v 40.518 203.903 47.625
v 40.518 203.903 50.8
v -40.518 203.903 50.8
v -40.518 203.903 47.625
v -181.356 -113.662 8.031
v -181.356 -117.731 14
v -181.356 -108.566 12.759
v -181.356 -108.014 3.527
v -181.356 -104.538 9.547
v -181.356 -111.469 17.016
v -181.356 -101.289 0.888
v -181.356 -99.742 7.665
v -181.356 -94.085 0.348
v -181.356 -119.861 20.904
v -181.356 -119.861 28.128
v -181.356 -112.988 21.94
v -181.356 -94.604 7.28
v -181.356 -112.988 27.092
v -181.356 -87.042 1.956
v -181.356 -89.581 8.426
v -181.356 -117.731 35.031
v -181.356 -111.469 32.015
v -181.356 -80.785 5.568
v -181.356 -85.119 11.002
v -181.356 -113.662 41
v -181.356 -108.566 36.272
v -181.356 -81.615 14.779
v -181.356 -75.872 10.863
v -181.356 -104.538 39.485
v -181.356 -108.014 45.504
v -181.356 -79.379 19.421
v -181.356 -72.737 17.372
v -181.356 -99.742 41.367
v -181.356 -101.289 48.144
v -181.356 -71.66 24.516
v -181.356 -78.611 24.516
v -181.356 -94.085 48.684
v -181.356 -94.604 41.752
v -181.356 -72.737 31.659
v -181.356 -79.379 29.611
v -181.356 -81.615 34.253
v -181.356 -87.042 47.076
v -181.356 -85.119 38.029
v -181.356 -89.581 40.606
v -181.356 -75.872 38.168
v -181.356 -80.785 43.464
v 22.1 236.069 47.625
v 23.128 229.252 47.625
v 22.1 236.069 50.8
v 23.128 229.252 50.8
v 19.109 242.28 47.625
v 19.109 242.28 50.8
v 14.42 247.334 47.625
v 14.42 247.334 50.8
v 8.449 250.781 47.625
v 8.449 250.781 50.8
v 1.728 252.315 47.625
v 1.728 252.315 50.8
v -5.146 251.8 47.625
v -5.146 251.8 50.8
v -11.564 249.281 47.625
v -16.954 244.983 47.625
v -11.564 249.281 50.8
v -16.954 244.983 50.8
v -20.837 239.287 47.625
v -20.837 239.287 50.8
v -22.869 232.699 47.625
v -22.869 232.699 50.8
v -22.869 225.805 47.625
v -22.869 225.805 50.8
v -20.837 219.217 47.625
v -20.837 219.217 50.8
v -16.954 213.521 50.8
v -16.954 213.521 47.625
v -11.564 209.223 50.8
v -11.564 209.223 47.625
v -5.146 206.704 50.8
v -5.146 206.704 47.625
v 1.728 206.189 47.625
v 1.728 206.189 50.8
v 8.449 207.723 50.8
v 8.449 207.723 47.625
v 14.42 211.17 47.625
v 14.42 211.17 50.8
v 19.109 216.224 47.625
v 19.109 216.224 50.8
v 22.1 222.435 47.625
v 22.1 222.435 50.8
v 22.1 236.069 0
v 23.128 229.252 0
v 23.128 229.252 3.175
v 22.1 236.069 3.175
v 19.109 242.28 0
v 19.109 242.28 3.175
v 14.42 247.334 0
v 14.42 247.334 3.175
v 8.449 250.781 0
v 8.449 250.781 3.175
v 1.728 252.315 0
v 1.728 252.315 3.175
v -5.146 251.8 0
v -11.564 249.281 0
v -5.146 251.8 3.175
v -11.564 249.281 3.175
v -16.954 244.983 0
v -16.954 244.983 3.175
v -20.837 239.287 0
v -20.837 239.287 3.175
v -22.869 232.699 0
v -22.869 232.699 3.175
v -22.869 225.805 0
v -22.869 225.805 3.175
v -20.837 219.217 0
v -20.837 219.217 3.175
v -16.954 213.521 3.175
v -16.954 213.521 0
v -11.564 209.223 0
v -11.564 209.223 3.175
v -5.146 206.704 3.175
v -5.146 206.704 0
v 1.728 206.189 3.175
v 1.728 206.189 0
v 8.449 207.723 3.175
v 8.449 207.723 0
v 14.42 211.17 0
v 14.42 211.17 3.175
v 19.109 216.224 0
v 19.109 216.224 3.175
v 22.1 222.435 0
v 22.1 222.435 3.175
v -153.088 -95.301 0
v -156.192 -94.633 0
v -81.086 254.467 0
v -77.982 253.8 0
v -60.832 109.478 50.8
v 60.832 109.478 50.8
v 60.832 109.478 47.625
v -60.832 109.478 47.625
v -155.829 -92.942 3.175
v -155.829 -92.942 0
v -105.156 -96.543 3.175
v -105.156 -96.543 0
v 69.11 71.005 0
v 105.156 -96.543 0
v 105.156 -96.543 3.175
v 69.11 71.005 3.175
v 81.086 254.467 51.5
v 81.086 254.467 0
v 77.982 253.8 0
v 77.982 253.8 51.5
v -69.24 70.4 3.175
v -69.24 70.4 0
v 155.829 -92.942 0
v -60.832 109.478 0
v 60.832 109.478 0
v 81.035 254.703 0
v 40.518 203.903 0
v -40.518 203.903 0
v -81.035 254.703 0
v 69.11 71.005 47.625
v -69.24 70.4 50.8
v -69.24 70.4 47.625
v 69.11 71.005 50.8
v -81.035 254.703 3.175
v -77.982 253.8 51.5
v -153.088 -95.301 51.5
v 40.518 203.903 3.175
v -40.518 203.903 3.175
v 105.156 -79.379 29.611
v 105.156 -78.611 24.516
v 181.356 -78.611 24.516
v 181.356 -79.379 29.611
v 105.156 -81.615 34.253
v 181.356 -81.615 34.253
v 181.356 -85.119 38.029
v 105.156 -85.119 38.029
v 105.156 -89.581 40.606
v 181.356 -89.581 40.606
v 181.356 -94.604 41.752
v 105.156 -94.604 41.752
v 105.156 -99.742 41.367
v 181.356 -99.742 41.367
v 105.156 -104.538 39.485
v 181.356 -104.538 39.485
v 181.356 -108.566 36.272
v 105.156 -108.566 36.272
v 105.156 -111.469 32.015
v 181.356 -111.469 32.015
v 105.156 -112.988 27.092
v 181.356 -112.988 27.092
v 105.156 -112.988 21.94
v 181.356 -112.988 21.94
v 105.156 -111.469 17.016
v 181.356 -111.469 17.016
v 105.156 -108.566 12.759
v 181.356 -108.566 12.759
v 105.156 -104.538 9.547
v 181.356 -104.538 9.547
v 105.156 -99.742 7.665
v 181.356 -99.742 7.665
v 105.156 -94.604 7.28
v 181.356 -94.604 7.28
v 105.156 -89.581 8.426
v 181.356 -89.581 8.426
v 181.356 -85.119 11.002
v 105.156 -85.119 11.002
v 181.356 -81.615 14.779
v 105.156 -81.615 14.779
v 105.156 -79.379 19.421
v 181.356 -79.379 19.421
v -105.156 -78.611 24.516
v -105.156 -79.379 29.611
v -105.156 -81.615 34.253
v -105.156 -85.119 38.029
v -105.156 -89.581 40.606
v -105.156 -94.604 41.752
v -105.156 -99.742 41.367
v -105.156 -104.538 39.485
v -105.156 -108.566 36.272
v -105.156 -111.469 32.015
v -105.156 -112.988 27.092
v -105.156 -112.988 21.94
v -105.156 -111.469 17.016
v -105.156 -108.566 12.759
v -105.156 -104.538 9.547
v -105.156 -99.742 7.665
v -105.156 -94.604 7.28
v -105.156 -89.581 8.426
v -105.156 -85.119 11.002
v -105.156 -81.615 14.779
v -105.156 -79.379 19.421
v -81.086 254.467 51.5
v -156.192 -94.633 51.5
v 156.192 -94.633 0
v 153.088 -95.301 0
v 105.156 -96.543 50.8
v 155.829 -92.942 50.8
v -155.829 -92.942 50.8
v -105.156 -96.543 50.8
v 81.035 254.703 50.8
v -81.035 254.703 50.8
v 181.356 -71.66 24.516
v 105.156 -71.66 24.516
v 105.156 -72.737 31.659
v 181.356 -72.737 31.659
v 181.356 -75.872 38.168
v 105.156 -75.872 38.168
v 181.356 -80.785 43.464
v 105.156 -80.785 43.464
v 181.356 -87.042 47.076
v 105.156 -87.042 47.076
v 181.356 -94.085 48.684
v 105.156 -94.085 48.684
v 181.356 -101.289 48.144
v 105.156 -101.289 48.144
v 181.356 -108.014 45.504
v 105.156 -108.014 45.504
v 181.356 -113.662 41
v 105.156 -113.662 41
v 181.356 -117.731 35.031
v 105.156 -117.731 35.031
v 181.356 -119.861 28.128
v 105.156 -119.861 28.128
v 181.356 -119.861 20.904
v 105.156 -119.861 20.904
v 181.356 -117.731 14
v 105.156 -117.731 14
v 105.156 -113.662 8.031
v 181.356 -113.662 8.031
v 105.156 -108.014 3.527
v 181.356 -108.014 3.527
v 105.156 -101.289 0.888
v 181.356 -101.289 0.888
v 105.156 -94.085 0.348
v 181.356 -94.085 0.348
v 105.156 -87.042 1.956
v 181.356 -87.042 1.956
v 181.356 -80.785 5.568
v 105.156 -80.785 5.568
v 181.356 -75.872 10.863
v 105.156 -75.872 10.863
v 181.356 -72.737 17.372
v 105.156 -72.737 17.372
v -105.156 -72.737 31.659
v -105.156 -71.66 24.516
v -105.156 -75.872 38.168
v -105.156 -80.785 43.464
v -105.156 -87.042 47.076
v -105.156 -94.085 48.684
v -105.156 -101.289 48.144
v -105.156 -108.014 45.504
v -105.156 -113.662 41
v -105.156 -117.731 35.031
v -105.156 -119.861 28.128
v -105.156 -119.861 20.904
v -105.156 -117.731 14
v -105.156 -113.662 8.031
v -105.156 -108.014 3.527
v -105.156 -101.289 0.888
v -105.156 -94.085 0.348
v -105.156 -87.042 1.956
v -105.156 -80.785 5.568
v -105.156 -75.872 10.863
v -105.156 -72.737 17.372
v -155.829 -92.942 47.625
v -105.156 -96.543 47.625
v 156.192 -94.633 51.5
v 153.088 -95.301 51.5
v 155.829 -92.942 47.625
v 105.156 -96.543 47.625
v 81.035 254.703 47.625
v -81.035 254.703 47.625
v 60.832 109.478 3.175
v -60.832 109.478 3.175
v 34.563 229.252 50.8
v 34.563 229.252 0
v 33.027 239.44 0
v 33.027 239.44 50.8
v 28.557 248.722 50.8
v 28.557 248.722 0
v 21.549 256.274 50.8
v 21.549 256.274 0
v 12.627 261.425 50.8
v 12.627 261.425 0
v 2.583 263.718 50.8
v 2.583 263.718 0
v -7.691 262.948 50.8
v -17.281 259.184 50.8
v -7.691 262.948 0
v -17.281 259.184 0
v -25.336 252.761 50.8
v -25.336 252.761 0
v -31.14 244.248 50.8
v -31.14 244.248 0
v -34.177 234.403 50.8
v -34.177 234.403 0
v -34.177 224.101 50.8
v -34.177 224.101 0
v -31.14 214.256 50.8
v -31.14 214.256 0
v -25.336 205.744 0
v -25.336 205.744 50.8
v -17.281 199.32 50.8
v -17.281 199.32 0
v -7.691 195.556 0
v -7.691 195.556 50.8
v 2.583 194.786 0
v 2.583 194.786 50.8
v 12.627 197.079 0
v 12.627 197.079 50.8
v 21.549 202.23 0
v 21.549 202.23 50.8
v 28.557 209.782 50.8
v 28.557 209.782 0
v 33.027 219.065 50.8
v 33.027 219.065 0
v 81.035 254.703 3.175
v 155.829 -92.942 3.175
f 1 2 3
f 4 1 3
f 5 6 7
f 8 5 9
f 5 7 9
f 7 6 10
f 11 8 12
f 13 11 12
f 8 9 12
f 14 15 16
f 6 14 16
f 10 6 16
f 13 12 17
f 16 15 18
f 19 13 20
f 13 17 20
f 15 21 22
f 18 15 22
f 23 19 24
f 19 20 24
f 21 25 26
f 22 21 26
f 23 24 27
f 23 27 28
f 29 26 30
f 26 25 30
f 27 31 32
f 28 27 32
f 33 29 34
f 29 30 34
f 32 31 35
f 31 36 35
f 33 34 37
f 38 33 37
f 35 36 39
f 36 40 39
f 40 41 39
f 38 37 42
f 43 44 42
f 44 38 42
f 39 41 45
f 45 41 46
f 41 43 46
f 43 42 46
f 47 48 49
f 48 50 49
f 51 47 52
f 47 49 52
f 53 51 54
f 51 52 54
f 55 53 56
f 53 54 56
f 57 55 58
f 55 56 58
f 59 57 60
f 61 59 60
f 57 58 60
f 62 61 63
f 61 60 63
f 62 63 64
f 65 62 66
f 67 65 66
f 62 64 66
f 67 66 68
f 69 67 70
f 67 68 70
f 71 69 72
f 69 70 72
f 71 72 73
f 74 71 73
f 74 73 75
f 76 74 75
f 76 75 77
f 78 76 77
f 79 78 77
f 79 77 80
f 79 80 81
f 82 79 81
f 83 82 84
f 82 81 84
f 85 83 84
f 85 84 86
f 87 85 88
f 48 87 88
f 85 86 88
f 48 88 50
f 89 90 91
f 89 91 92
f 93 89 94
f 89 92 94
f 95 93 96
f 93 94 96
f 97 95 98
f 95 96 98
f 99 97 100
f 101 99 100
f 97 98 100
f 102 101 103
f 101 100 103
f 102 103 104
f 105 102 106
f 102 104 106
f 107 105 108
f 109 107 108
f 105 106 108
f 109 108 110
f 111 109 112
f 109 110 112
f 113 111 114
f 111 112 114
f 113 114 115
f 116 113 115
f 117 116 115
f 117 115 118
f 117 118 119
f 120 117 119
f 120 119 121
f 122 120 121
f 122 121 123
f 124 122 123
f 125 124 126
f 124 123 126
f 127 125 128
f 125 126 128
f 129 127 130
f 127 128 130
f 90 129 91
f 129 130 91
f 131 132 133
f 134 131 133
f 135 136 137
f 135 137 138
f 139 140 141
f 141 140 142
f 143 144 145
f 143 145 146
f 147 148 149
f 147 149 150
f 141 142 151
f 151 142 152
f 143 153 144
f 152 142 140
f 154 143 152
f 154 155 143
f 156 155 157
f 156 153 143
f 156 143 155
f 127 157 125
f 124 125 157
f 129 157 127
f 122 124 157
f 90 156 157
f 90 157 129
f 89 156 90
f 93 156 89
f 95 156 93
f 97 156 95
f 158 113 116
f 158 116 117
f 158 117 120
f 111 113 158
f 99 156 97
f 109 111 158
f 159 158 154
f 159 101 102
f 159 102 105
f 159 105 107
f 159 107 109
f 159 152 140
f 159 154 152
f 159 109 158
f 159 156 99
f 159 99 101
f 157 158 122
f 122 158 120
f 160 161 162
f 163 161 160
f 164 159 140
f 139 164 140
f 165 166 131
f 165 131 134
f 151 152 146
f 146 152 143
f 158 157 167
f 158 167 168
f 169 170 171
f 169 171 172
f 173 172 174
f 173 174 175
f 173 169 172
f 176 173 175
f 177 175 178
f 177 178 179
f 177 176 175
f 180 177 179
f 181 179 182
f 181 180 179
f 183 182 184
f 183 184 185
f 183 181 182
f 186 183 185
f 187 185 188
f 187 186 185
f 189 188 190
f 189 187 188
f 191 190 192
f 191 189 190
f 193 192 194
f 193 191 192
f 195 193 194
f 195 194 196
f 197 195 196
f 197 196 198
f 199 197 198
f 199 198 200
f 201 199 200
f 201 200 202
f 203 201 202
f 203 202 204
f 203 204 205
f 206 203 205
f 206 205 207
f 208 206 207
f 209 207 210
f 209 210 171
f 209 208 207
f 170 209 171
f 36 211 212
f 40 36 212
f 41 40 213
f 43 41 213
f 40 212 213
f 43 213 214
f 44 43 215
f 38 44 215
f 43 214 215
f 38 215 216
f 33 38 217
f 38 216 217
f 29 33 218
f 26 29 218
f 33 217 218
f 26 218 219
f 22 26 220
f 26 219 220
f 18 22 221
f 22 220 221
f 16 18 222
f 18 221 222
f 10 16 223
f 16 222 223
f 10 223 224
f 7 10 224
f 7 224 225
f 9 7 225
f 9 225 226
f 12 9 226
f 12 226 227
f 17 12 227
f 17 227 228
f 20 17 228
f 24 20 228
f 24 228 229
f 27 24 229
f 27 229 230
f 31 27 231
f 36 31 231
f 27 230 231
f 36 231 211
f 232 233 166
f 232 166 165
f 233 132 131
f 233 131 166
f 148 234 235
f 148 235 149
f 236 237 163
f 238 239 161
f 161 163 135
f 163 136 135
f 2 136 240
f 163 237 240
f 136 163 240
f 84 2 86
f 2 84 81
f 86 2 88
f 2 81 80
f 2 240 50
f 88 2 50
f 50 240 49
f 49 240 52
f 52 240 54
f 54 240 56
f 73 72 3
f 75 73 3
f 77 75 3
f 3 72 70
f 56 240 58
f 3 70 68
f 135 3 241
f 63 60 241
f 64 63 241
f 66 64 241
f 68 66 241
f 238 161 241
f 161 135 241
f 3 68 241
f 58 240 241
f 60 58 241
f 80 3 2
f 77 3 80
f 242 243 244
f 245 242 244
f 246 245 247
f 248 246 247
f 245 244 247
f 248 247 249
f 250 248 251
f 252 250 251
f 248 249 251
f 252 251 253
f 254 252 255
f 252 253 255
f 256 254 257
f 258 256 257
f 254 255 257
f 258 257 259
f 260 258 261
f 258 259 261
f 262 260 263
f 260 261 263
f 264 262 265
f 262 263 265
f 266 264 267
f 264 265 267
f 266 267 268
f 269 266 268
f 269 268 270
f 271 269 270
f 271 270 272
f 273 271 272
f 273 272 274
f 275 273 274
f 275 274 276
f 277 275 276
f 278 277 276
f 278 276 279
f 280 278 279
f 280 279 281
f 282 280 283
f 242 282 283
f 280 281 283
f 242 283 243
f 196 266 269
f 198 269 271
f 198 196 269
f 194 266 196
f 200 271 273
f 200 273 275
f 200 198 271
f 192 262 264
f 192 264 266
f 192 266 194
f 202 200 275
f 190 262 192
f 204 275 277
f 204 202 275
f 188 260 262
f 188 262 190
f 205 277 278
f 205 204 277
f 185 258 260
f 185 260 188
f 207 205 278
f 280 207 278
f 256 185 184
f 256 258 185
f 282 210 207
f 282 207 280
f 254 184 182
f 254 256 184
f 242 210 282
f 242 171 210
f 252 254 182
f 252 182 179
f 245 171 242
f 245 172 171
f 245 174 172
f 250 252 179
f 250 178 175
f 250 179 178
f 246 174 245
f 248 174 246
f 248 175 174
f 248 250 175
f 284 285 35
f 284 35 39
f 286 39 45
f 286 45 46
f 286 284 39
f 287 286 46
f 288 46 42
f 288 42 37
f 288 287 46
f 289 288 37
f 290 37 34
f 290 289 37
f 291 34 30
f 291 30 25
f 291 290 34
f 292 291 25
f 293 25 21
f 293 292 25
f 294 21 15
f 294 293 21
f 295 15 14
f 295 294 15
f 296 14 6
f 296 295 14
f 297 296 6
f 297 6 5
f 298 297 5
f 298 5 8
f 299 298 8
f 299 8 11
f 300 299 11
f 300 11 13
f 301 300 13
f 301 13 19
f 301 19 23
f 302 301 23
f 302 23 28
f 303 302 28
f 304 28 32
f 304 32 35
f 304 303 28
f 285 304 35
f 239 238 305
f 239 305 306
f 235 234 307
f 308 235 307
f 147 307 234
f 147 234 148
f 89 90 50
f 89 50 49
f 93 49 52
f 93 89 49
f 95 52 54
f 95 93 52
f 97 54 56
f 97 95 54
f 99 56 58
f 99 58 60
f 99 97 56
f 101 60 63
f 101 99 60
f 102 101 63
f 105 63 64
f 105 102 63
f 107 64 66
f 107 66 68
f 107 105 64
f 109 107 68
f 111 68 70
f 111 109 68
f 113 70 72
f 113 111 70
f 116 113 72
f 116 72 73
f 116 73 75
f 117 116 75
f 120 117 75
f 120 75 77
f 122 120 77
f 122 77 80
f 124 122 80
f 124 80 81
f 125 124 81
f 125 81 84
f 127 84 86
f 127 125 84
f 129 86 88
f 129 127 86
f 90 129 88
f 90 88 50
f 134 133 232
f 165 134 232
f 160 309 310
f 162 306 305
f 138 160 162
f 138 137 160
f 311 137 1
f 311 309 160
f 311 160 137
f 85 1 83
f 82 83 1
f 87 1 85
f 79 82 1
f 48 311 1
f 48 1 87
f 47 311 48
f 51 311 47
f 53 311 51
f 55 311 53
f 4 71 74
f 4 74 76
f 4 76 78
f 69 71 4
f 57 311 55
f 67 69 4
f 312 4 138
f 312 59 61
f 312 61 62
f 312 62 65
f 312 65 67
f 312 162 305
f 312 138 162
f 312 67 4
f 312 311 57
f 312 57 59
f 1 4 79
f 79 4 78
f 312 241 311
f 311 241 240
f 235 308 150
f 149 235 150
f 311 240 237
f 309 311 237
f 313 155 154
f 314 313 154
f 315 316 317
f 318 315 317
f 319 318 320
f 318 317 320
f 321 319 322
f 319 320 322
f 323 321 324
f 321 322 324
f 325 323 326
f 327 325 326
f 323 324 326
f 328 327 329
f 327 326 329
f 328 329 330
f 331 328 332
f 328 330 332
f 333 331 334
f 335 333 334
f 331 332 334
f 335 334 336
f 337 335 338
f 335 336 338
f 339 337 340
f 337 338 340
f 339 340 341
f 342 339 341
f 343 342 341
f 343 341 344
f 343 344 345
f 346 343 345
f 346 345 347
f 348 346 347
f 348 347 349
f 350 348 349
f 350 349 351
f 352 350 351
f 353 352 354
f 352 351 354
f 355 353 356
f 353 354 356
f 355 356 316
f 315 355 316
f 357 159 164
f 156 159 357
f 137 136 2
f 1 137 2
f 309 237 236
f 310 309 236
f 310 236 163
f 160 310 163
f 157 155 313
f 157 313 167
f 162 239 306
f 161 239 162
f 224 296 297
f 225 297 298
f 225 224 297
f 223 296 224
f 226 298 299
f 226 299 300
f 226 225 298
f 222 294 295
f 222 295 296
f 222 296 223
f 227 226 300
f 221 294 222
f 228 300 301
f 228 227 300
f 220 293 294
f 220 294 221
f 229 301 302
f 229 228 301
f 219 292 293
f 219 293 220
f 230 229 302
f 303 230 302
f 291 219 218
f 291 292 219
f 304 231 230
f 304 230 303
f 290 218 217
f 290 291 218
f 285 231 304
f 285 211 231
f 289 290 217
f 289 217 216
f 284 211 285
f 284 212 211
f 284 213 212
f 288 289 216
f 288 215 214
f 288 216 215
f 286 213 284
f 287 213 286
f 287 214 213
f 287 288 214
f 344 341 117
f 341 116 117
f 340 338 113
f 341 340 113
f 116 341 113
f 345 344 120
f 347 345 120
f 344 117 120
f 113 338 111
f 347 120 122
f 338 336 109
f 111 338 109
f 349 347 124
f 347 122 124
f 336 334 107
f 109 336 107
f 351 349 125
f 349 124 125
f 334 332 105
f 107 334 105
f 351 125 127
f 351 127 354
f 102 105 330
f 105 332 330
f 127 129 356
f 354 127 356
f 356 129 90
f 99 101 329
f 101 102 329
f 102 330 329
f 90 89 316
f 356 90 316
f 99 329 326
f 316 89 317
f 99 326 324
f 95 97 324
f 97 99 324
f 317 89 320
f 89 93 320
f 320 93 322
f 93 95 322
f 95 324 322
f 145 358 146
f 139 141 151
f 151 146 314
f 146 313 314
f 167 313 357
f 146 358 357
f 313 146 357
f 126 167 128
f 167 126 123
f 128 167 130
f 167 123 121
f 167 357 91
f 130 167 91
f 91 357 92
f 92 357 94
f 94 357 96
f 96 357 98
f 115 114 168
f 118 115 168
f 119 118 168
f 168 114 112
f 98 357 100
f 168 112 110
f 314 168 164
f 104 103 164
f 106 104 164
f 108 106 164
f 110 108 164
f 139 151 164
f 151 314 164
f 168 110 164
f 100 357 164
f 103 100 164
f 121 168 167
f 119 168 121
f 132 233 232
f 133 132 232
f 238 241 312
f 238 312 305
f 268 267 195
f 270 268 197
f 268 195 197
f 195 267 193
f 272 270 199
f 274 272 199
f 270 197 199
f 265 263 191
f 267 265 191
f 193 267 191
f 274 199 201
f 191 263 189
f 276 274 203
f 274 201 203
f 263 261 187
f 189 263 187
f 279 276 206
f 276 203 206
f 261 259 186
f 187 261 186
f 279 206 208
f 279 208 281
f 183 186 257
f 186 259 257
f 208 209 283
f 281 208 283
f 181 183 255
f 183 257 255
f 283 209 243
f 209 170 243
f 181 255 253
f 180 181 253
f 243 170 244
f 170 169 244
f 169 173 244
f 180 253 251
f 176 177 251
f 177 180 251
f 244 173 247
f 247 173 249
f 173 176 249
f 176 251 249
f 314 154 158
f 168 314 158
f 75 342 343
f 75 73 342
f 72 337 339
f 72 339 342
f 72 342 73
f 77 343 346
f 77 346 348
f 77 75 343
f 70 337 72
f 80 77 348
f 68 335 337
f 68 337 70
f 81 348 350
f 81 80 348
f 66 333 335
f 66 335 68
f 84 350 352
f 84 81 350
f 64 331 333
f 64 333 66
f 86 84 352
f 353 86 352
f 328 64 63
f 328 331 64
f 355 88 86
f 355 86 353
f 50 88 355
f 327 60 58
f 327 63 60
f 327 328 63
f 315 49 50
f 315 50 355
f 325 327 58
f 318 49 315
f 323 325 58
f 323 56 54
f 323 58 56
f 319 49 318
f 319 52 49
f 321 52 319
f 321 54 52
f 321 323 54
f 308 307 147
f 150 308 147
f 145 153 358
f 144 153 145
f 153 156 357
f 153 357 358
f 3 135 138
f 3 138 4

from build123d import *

# Parameters (mm, degrees)
F1_DEPTH  = 3.175
F3_DEPTH  = 3.175
F7_W      = 357.0883721113
F7_H      = 51.4995157719
F8_DEPTH  = 3.175
F10_R     = 24.2355196554
F10_R_2   = 17.2845850153
F19_DEPTH = 76.2
F20_R     = 34.5625940256
F20_R_2   = 23.1276455752
F12_DEPTH = 50.8
F21_DEPTH = 63.5


# Not quite as in the source:
# - a feature of the source that left no trace in its solid (it failed there, or was rolled back) is left out
# - a feature names something its author has since deleted; it is built from what else it names


with BuildPart() as f1:
    # F0 (on face) → F1 (new body)
    with BuildSketch(Plane.XY):
        Polygon((0, 254.7029479625), (-81.0354214167, 254.7029479625), (-155.8285728535, -92.9424813159), (-105.1563591477, -96.5434198266), (-40.5177107084, 203.9029479625), (0, 203.9029479625), align=None)
    extrude(amount=F1_DEPTH)

    # F2: F1 across plane


with BuildPart() as f1_1:
    add(f1.part)
    add(f1.part.mirror(Plane.YZ))

    # F17 (on Top) → F3 (join)
    with BuildSketch(Plane.XY):
        Polygon((64.138263464, 109.4782650471), (-71.3108032942, 109.4782650471), (-85.4815393686, 70.3290700912), (86.3957703114, 71.0801482201), align=None)
    extrude(amount=F3_DEPTH)


with BuildPart() as f5_1:
    # F5: instance of F1
    add(f1_1.part.mirror(Plane.XY.offset(25.4)))


with BuildPart() as f8:
    # F7 (on 3pt) → F8 (new body)
    with BuildSketch(Plane(origin=(-129.823703286, 27.9305380776, 0), x_dir=(0.2103294472, 0.977630566, 0), z_dir=(0.977630566, -0.2103294472, 0))):
        with Locations((53.176112473, 25.7497578859)):
            Rectangle(F7_W, F7_H)
    extrude(amount=F8_DEPTH)


with BuildPart() as f18_1:
    # F18: instance of F8
    add(f8.part.mirror(Plane.YZ))


with BuildPart() as f19:
    # F10 (on plane+point) → F19 (new body)
    with BuildSketch(Plane.YZ.offset(105.1563591477)):
        with Locations((-95.8959981799, 24.5158076286)):
            Circle(F10_R)
        with Locations((-95.8959981799, 24.5158076286)):
            Circle(F10_R_2, mode=Mode.SUBTRACT)
    extrude(amount=F19_DEPTH)


with BuildPart() as f11_1:
    # F11: instance of F19
    add(f19.part.mirror(Plane.YZ))


with BuildPart() as f12:
    # F20 (on Top) → F12 (new body)
    with BuildSketch(Plane.XY):
        with Locations((0, 229.2520552874)):
            Circle(F20_R)
        with Locations((0, 229.2520552874)):
            Circle(F20_R_2, mode=Mode.SUBTRACT)
    extrude(amount=F12_DEPTH)


with BuildPart() as f21_tool:
    # F20 (on Top) → F21 (new body, symmetric)
    with BuildSketch(Plane.XY):
        with Locations((0, 229.2520552874)):
            Circle(F20_R_2)
    extrude(amount=F21_DEPTH, both=True)


with BuildPart() as f1_2:
    add(f1_1.part)

    # F21: cut by f21_tool
    add(f21_tool.part, mode=Mode.SUBTRACT)


with BuildPart() as f5_1_1:
    add(f5_1.part)

    # F21: cut by f21_tool
    add(f21_tool.part, mode=Mode.SUBTRACT)


solid = Compound([f8.part, f18_1.part, f19.part, f11_1.part, f12.part, f1_2.part, f5_1_1.part])
